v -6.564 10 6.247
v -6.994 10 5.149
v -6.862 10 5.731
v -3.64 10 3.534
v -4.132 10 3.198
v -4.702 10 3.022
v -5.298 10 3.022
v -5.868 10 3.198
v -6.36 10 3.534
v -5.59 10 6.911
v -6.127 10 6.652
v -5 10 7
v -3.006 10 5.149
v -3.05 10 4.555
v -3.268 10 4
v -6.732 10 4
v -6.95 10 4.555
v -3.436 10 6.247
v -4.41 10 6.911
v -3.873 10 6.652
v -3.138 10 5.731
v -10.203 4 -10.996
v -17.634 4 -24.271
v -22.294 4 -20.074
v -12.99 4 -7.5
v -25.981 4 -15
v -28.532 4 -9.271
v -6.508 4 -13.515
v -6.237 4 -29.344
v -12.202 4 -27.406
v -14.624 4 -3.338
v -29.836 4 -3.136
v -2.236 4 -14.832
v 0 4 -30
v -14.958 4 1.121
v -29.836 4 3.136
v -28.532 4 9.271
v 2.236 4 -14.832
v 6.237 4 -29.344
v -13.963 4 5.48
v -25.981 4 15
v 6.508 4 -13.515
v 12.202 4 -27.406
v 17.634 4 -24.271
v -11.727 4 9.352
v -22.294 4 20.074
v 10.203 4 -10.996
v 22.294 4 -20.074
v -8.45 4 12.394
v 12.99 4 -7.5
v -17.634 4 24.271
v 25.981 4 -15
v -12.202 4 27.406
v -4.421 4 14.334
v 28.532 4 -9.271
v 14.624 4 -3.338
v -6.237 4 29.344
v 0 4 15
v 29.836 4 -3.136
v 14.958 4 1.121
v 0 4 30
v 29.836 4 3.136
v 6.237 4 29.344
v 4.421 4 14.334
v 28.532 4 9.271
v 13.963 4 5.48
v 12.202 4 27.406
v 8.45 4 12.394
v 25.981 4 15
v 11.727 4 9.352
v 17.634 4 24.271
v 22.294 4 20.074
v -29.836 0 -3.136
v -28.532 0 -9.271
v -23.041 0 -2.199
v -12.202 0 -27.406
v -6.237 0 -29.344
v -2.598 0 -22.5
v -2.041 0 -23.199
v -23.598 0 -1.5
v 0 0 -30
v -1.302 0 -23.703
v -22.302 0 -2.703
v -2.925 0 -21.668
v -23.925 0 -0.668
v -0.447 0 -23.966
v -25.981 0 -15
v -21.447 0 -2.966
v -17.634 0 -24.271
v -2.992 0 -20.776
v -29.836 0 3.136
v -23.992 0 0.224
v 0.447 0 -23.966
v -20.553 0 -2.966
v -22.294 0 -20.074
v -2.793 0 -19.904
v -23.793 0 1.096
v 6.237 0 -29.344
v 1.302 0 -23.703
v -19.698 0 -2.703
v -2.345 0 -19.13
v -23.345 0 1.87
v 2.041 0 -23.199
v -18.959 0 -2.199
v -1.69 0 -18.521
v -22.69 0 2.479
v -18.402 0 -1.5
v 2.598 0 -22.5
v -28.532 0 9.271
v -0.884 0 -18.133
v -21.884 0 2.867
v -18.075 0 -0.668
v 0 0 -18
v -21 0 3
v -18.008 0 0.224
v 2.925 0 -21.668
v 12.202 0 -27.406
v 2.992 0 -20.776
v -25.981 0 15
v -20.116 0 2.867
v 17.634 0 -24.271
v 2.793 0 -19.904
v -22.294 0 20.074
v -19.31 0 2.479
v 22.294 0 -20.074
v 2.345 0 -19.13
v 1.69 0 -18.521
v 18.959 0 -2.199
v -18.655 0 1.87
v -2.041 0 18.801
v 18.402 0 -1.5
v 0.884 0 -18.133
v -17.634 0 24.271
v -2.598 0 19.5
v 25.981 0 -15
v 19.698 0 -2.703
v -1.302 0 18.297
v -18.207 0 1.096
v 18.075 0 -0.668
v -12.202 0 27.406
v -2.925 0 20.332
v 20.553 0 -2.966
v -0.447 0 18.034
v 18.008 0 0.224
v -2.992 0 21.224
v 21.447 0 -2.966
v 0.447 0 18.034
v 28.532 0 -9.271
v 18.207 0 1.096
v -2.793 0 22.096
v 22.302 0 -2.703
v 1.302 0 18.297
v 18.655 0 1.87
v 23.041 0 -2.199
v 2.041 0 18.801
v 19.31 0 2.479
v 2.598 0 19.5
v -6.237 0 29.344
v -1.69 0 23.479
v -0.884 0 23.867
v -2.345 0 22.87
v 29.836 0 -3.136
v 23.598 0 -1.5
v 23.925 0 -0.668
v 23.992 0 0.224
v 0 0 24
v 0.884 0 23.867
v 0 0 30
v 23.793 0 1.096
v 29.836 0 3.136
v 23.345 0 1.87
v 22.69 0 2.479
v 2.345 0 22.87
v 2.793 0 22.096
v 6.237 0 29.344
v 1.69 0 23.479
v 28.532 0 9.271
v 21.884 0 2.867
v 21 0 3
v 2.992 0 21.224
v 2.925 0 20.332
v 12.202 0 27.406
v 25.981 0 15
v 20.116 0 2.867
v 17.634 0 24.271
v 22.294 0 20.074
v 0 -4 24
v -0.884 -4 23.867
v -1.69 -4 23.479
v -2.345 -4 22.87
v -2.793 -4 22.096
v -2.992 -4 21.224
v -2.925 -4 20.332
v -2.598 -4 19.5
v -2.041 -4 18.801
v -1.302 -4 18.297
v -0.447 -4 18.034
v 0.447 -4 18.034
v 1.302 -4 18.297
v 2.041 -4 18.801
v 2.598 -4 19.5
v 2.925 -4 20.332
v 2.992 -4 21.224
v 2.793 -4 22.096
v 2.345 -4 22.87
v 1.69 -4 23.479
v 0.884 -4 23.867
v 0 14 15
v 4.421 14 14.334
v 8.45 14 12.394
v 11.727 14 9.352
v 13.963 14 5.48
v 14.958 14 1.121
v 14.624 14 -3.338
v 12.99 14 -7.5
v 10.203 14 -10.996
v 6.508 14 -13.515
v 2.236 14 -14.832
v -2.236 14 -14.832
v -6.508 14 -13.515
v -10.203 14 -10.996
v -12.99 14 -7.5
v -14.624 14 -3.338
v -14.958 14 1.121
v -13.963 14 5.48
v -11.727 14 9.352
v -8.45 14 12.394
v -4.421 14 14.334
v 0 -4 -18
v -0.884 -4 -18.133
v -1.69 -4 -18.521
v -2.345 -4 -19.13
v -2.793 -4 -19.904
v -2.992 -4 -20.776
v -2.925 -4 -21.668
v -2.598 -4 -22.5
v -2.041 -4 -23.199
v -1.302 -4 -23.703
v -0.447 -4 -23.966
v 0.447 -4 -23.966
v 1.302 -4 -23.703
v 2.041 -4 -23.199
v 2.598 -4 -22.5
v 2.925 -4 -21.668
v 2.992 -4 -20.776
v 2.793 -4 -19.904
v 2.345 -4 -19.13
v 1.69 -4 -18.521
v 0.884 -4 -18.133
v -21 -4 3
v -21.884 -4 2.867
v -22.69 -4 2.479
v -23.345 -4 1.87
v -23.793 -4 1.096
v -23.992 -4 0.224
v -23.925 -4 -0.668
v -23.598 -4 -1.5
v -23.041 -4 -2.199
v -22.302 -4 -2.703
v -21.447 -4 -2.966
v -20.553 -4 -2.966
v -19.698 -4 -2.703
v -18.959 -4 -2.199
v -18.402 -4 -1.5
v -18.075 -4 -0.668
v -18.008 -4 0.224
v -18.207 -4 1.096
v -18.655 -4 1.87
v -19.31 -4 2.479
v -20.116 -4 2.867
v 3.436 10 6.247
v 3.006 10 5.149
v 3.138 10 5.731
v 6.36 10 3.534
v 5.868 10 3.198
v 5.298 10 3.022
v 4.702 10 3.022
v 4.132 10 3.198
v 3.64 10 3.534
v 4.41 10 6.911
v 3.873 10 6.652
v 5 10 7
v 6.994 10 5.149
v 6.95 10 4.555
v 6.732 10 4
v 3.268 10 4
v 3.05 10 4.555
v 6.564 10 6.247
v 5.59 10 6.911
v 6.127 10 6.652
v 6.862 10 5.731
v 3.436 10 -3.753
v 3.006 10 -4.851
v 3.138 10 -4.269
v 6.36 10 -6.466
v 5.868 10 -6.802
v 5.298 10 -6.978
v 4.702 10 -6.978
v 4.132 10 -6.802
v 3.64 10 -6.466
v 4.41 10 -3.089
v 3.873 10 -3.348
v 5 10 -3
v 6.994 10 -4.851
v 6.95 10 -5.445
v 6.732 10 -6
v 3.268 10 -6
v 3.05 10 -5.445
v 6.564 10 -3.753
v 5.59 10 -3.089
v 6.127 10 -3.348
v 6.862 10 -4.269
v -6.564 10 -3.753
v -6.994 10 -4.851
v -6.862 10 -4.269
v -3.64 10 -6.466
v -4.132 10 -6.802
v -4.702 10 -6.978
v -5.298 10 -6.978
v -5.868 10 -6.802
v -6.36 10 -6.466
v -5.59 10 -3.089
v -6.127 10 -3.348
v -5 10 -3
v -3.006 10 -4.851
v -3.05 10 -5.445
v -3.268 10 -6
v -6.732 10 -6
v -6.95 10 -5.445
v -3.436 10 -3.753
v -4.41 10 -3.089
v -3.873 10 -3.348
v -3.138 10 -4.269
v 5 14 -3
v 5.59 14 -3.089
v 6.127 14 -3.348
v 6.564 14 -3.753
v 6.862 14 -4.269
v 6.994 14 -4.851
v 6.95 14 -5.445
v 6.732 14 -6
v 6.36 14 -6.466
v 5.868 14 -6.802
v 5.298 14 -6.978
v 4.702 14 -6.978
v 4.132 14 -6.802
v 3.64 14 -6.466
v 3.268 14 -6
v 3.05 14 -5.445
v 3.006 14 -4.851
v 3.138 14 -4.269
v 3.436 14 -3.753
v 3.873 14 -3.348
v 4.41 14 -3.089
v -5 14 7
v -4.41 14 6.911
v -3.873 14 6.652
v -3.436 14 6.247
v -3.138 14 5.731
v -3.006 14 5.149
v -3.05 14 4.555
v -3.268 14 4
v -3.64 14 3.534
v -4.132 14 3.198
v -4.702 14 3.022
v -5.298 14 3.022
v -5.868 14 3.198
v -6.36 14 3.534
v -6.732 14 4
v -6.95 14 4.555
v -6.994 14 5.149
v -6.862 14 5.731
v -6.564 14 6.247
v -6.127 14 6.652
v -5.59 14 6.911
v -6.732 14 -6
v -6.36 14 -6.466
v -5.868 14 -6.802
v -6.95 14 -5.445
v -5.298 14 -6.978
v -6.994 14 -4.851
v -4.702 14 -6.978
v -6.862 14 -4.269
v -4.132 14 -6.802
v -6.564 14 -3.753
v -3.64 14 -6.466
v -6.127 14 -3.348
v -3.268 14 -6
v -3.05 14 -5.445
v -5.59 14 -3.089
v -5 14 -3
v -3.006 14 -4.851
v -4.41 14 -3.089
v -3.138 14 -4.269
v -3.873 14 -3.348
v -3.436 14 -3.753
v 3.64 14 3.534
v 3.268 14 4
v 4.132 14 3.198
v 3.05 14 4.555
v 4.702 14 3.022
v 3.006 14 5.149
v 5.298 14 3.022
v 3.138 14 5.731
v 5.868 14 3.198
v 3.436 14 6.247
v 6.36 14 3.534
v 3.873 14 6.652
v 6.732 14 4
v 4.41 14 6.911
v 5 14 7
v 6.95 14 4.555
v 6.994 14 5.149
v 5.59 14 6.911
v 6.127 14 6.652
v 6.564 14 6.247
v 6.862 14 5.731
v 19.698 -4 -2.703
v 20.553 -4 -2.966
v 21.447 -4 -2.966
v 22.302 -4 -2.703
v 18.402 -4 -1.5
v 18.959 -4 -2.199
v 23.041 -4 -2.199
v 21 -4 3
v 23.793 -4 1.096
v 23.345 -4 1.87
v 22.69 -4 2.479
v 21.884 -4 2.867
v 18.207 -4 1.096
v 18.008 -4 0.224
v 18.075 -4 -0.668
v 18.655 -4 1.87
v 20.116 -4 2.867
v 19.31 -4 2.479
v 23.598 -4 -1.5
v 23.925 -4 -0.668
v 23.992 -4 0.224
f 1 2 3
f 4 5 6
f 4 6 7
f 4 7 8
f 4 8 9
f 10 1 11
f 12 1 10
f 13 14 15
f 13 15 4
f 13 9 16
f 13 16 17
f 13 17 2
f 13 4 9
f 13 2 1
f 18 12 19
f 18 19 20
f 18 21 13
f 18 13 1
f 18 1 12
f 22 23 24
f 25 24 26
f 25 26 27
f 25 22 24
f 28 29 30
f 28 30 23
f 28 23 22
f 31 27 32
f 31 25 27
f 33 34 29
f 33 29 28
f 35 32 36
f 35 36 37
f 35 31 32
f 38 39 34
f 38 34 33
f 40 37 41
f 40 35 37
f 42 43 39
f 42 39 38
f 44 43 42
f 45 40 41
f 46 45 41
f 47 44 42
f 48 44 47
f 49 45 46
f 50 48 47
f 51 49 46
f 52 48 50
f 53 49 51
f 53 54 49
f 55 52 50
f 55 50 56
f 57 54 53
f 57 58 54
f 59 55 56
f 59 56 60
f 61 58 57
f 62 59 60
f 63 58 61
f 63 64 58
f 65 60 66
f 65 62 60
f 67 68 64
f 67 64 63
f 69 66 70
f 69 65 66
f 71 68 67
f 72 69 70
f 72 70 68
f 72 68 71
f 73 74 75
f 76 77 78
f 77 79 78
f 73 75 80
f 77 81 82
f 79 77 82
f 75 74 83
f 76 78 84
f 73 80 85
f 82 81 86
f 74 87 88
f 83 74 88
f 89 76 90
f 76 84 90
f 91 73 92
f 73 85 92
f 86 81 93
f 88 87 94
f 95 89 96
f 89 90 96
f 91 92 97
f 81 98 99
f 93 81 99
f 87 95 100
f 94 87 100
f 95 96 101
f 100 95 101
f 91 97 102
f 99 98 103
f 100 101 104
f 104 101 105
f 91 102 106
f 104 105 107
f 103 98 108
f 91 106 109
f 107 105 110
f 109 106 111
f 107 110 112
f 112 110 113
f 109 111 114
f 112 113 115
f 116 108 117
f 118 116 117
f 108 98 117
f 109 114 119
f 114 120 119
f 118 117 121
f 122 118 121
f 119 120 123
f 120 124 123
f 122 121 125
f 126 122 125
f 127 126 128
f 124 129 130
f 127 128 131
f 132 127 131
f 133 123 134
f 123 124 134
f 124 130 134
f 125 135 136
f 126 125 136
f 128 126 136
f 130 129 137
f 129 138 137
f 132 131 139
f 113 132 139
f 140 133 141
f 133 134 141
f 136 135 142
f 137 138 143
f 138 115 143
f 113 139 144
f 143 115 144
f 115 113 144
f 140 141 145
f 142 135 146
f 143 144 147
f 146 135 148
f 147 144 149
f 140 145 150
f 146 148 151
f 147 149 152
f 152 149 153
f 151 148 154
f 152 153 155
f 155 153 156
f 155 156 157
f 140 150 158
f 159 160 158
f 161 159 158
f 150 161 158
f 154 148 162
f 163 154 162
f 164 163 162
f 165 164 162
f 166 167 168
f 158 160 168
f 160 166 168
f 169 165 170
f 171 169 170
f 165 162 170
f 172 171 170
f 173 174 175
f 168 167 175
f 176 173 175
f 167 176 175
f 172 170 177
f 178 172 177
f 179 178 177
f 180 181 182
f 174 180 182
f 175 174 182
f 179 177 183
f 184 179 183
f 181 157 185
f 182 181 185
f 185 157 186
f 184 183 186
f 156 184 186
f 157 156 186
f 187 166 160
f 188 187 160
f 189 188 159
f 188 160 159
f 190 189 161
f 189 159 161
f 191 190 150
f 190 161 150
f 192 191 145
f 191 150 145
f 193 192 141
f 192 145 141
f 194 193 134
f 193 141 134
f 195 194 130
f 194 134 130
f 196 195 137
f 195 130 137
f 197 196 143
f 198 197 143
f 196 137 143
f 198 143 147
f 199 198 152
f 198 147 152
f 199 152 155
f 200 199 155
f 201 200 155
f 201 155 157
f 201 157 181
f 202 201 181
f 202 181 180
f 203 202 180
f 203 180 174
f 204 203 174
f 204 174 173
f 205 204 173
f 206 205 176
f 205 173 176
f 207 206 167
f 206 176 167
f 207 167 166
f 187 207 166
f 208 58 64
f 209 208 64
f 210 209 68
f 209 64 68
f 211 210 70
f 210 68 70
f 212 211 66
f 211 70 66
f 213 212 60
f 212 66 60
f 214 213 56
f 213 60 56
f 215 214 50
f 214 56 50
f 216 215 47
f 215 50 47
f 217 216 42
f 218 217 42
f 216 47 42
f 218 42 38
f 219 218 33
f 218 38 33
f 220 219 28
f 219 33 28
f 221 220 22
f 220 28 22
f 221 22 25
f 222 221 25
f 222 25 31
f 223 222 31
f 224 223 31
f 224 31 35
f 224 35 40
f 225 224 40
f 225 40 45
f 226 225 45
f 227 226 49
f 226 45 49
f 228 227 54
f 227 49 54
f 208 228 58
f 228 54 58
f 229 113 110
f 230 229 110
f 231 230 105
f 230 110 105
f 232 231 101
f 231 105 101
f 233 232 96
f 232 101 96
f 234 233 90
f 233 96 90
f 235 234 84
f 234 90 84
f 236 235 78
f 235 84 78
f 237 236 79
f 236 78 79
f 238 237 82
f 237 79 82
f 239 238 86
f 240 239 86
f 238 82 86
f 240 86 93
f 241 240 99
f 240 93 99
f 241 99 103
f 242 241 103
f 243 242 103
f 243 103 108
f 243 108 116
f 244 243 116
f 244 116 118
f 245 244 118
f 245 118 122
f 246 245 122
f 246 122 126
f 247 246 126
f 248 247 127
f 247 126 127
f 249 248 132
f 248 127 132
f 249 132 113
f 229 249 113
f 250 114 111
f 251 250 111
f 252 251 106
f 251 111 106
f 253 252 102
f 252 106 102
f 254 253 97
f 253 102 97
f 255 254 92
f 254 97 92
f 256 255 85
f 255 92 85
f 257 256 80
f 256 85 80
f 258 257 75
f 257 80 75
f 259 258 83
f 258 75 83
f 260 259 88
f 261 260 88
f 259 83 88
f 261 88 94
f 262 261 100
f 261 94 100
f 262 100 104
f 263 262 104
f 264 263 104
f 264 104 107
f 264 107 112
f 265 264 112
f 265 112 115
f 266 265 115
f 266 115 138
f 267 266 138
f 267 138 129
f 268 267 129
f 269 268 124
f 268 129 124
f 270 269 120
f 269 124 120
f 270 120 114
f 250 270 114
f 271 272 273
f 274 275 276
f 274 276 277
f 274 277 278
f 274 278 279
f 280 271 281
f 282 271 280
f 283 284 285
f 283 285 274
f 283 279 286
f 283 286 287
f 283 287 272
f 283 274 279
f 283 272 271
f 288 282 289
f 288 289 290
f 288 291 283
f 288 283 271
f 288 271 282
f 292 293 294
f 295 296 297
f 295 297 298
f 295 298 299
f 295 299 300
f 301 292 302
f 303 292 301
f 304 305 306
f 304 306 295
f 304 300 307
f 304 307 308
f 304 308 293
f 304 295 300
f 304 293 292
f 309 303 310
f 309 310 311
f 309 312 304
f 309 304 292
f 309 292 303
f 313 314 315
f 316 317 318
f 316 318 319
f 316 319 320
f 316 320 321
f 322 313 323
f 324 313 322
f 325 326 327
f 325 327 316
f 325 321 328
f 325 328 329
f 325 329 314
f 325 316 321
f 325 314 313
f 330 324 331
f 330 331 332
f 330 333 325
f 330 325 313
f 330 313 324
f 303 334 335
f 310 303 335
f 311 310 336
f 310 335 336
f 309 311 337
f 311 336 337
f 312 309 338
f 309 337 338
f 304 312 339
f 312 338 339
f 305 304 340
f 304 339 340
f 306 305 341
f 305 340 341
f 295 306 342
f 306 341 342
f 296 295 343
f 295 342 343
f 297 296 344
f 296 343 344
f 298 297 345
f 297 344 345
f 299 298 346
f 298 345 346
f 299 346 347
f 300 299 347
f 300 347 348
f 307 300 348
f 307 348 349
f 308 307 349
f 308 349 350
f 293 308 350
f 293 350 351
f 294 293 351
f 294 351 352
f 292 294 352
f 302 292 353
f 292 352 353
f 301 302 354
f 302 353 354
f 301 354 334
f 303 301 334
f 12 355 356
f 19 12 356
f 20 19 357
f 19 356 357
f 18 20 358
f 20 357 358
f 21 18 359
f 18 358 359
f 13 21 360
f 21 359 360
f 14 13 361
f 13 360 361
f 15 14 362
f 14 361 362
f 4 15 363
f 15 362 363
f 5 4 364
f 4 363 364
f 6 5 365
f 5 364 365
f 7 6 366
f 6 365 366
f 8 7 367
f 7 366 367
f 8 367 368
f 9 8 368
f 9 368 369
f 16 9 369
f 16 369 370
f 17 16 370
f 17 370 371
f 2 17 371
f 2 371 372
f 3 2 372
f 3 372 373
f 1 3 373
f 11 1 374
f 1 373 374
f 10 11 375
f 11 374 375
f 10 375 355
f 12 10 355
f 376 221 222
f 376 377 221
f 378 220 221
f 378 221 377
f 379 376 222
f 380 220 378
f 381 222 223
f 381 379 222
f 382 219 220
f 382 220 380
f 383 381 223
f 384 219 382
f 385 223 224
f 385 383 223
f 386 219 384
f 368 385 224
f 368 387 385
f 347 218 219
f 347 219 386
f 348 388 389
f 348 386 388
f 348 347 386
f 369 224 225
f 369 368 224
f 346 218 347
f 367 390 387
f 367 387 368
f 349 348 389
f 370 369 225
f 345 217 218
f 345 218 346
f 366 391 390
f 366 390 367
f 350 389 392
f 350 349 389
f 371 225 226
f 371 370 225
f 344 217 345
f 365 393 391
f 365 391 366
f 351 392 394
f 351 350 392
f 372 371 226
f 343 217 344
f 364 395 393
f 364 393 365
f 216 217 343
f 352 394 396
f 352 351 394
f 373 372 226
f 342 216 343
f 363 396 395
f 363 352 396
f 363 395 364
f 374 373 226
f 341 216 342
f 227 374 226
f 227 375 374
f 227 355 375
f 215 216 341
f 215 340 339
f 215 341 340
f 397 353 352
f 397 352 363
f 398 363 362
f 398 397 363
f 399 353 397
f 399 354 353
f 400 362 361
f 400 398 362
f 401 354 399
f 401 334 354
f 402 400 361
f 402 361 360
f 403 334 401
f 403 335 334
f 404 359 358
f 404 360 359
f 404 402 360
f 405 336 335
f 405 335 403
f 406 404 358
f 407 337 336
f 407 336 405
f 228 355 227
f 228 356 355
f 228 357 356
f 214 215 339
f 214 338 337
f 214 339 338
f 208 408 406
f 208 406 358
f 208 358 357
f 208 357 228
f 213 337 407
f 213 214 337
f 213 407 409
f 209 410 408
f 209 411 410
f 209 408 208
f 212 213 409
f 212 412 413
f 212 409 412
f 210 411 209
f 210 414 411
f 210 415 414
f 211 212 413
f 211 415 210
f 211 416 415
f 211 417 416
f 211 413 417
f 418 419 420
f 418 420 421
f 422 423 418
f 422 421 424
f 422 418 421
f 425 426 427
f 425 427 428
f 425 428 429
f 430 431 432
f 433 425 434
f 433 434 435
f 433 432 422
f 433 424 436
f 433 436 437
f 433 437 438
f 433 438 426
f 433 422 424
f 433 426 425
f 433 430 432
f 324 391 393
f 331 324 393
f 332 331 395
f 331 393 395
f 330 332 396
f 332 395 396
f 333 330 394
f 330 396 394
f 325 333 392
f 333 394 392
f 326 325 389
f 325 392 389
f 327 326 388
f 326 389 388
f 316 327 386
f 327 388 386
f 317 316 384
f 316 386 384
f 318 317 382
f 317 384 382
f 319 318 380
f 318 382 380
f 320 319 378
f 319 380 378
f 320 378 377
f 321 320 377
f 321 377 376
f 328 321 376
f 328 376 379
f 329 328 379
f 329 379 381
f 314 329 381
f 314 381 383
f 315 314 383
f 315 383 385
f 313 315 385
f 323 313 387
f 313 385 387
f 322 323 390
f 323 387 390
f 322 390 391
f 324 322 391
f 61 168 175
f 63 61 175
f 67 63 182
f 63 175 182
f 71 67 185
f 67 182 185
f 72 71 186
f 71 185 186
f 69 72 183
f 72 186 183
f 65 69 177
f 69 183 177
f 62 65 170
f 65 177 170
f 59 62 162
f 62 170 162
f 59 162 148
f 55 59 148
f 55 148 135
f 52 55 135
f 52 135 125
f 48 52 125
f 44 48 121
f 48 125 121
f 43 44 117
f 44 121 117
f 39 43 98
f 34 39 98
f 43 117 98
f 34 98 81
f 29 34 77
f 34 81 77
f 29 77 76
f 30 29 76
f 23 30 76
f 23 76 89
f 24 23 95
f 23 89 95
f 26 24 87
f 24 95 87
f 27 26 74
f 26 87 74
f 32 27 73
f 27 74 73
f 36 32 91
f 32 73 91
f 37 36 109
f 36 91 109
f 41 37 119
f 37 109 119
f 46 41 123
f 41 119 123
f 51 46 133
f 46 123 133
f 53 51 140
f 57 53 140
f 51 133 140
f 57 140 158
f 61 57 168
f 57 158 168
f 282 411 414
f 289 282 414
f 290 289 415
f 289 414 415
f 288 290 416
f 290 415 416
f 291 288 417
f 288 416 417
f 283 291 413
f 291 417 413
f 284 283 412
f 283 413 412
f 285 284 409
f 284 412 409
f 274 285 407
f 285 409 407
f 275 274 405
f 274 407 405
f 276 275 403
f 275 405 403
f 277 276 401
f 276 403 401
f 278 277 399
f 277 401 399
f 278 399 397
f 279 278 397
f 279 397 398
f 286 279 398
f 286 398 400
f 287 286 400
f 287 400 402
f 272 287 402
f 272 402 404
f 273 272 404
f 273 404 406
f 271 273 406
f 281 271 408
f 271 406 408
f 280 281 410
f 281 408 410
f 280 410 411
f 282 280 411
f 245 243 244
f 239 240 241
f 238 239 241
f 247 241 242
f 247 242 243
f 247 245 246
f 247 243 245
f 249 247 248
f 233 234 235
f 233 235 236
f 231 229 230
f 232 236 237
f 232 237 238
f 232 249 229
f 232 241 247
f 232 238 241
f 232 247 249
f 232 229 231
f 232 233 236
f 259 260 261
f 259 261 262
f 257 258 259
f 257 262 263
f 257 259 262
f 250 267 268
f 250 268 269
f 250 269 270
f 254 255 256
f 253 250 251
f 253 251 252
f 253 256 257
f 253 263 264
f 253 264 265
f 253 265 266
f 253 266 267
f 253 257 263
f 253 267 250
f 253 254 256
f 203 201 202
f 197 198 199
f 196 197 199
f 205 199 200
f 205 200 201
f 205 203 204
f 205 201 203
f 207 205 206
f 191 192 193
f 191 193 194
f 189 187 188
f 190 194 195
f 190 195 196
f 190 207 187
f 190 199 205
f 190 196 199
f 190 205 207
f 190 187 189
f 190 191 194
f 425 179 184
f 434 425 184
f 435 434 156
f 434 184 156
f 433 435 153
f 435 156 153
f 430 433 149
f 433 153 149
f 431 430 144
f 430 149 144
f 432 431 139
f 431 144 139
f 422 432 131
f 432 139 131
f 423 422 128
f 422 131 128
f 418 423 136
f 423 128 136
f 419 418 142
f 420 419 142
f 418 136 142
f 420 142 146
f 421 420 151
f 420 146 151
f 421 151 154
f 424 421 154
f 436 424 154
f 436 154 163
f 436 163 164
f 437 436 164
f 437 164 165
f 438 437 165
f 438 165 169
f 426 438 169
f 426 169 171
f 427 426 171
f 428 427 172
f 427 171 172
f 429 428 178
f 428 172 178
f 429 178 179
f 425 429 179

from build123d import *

# Parameters (mm, degrees)
SKETCH1_R           = 30
BOSS_EXTRUDE1_DEPTH = 4
SKETCH2_R           = 15
BOSS_EXTRUDE2_DEPTH = 10
SKETCH3_R           = 3
BOSS_EXTRUDE3_DEPTH = 4
SKETCH4_R           = 2
CUT_EXTRUDE1_DEPTH  = 4


with BuildPart() as part:
    # Sketch1 → Boss-Extrude1 (new body)
    with BuildSketch(Plane(origin=(0, 0, 0), x_dir=(1, 0, 0), z_dir=(0, 1, 0))):
        with Locations(Location((0, 0, 0), (0, 0, 270))):
            Circle(SKETCH1_R)
    extrude(amount=BOSS_EXTRUDE1_DEPTH)

    # Sketch2 → Boss-Extrude2 (add)
    with BuildSketch(Plane(origin=(0, 4, 0), x_dir=(1, 0, 0), z_dir=(0, 1, 0))):
        with Locations(Location((0, 0, 0), (0, 0, 270))):
            Circle(SKETCH2_R)
    extrude(amount=BOSS_EXTRUDE2_DEPTH)

    # Sketch3 → Boss-Extrude3 (add)
    with BuildSketch(Plane.XZ):
        with Locations(Location((-21, 0, 0), (0, 0, 90))):
            Circle(SKETCH3_R)
        with Locations(Location((0, 21, 0), (0, 0, 90))):
            Circle(SKETCH3_R)
        with Locations(Location((21, 0, 0), (0, 0, 90))):
            Circle(SKETCH3_R)
        with Locations(Location((0, -21, 0), (0, 0, 90))):
            Circle(SKETCH3_R)
    extrude(amount=BOSS_EXTRUDE3_DEPTH)

    # Sketch4 → Cut-Extrude1 (cut)
    with BuildSketch(Plane(origin=(0, 14, 0), x_dir=(1, 0, 0), z_dir=(0, 1, 0))):
        with Locations(Location((-5, 5, 0), (0, 0, 270))):
            Circle(SKETCH4_R)
        with Locations(Location((5, 5, 0), (0, 0, 270))):
            Circle(SKETCH4_R)
        with Locations(Location((5, -5, 0), (0, 0, 270))):
            Circle(SKETCH4_R)
        with Locations(Location((-5, -5, 0), (0, 0, 270))):
            Circle(SKETCH4_R)
    extrude(amount=-CUT_EXTRUDE1_DEPTH, mode=Mode.SUBTRACT)


solid = part.part
